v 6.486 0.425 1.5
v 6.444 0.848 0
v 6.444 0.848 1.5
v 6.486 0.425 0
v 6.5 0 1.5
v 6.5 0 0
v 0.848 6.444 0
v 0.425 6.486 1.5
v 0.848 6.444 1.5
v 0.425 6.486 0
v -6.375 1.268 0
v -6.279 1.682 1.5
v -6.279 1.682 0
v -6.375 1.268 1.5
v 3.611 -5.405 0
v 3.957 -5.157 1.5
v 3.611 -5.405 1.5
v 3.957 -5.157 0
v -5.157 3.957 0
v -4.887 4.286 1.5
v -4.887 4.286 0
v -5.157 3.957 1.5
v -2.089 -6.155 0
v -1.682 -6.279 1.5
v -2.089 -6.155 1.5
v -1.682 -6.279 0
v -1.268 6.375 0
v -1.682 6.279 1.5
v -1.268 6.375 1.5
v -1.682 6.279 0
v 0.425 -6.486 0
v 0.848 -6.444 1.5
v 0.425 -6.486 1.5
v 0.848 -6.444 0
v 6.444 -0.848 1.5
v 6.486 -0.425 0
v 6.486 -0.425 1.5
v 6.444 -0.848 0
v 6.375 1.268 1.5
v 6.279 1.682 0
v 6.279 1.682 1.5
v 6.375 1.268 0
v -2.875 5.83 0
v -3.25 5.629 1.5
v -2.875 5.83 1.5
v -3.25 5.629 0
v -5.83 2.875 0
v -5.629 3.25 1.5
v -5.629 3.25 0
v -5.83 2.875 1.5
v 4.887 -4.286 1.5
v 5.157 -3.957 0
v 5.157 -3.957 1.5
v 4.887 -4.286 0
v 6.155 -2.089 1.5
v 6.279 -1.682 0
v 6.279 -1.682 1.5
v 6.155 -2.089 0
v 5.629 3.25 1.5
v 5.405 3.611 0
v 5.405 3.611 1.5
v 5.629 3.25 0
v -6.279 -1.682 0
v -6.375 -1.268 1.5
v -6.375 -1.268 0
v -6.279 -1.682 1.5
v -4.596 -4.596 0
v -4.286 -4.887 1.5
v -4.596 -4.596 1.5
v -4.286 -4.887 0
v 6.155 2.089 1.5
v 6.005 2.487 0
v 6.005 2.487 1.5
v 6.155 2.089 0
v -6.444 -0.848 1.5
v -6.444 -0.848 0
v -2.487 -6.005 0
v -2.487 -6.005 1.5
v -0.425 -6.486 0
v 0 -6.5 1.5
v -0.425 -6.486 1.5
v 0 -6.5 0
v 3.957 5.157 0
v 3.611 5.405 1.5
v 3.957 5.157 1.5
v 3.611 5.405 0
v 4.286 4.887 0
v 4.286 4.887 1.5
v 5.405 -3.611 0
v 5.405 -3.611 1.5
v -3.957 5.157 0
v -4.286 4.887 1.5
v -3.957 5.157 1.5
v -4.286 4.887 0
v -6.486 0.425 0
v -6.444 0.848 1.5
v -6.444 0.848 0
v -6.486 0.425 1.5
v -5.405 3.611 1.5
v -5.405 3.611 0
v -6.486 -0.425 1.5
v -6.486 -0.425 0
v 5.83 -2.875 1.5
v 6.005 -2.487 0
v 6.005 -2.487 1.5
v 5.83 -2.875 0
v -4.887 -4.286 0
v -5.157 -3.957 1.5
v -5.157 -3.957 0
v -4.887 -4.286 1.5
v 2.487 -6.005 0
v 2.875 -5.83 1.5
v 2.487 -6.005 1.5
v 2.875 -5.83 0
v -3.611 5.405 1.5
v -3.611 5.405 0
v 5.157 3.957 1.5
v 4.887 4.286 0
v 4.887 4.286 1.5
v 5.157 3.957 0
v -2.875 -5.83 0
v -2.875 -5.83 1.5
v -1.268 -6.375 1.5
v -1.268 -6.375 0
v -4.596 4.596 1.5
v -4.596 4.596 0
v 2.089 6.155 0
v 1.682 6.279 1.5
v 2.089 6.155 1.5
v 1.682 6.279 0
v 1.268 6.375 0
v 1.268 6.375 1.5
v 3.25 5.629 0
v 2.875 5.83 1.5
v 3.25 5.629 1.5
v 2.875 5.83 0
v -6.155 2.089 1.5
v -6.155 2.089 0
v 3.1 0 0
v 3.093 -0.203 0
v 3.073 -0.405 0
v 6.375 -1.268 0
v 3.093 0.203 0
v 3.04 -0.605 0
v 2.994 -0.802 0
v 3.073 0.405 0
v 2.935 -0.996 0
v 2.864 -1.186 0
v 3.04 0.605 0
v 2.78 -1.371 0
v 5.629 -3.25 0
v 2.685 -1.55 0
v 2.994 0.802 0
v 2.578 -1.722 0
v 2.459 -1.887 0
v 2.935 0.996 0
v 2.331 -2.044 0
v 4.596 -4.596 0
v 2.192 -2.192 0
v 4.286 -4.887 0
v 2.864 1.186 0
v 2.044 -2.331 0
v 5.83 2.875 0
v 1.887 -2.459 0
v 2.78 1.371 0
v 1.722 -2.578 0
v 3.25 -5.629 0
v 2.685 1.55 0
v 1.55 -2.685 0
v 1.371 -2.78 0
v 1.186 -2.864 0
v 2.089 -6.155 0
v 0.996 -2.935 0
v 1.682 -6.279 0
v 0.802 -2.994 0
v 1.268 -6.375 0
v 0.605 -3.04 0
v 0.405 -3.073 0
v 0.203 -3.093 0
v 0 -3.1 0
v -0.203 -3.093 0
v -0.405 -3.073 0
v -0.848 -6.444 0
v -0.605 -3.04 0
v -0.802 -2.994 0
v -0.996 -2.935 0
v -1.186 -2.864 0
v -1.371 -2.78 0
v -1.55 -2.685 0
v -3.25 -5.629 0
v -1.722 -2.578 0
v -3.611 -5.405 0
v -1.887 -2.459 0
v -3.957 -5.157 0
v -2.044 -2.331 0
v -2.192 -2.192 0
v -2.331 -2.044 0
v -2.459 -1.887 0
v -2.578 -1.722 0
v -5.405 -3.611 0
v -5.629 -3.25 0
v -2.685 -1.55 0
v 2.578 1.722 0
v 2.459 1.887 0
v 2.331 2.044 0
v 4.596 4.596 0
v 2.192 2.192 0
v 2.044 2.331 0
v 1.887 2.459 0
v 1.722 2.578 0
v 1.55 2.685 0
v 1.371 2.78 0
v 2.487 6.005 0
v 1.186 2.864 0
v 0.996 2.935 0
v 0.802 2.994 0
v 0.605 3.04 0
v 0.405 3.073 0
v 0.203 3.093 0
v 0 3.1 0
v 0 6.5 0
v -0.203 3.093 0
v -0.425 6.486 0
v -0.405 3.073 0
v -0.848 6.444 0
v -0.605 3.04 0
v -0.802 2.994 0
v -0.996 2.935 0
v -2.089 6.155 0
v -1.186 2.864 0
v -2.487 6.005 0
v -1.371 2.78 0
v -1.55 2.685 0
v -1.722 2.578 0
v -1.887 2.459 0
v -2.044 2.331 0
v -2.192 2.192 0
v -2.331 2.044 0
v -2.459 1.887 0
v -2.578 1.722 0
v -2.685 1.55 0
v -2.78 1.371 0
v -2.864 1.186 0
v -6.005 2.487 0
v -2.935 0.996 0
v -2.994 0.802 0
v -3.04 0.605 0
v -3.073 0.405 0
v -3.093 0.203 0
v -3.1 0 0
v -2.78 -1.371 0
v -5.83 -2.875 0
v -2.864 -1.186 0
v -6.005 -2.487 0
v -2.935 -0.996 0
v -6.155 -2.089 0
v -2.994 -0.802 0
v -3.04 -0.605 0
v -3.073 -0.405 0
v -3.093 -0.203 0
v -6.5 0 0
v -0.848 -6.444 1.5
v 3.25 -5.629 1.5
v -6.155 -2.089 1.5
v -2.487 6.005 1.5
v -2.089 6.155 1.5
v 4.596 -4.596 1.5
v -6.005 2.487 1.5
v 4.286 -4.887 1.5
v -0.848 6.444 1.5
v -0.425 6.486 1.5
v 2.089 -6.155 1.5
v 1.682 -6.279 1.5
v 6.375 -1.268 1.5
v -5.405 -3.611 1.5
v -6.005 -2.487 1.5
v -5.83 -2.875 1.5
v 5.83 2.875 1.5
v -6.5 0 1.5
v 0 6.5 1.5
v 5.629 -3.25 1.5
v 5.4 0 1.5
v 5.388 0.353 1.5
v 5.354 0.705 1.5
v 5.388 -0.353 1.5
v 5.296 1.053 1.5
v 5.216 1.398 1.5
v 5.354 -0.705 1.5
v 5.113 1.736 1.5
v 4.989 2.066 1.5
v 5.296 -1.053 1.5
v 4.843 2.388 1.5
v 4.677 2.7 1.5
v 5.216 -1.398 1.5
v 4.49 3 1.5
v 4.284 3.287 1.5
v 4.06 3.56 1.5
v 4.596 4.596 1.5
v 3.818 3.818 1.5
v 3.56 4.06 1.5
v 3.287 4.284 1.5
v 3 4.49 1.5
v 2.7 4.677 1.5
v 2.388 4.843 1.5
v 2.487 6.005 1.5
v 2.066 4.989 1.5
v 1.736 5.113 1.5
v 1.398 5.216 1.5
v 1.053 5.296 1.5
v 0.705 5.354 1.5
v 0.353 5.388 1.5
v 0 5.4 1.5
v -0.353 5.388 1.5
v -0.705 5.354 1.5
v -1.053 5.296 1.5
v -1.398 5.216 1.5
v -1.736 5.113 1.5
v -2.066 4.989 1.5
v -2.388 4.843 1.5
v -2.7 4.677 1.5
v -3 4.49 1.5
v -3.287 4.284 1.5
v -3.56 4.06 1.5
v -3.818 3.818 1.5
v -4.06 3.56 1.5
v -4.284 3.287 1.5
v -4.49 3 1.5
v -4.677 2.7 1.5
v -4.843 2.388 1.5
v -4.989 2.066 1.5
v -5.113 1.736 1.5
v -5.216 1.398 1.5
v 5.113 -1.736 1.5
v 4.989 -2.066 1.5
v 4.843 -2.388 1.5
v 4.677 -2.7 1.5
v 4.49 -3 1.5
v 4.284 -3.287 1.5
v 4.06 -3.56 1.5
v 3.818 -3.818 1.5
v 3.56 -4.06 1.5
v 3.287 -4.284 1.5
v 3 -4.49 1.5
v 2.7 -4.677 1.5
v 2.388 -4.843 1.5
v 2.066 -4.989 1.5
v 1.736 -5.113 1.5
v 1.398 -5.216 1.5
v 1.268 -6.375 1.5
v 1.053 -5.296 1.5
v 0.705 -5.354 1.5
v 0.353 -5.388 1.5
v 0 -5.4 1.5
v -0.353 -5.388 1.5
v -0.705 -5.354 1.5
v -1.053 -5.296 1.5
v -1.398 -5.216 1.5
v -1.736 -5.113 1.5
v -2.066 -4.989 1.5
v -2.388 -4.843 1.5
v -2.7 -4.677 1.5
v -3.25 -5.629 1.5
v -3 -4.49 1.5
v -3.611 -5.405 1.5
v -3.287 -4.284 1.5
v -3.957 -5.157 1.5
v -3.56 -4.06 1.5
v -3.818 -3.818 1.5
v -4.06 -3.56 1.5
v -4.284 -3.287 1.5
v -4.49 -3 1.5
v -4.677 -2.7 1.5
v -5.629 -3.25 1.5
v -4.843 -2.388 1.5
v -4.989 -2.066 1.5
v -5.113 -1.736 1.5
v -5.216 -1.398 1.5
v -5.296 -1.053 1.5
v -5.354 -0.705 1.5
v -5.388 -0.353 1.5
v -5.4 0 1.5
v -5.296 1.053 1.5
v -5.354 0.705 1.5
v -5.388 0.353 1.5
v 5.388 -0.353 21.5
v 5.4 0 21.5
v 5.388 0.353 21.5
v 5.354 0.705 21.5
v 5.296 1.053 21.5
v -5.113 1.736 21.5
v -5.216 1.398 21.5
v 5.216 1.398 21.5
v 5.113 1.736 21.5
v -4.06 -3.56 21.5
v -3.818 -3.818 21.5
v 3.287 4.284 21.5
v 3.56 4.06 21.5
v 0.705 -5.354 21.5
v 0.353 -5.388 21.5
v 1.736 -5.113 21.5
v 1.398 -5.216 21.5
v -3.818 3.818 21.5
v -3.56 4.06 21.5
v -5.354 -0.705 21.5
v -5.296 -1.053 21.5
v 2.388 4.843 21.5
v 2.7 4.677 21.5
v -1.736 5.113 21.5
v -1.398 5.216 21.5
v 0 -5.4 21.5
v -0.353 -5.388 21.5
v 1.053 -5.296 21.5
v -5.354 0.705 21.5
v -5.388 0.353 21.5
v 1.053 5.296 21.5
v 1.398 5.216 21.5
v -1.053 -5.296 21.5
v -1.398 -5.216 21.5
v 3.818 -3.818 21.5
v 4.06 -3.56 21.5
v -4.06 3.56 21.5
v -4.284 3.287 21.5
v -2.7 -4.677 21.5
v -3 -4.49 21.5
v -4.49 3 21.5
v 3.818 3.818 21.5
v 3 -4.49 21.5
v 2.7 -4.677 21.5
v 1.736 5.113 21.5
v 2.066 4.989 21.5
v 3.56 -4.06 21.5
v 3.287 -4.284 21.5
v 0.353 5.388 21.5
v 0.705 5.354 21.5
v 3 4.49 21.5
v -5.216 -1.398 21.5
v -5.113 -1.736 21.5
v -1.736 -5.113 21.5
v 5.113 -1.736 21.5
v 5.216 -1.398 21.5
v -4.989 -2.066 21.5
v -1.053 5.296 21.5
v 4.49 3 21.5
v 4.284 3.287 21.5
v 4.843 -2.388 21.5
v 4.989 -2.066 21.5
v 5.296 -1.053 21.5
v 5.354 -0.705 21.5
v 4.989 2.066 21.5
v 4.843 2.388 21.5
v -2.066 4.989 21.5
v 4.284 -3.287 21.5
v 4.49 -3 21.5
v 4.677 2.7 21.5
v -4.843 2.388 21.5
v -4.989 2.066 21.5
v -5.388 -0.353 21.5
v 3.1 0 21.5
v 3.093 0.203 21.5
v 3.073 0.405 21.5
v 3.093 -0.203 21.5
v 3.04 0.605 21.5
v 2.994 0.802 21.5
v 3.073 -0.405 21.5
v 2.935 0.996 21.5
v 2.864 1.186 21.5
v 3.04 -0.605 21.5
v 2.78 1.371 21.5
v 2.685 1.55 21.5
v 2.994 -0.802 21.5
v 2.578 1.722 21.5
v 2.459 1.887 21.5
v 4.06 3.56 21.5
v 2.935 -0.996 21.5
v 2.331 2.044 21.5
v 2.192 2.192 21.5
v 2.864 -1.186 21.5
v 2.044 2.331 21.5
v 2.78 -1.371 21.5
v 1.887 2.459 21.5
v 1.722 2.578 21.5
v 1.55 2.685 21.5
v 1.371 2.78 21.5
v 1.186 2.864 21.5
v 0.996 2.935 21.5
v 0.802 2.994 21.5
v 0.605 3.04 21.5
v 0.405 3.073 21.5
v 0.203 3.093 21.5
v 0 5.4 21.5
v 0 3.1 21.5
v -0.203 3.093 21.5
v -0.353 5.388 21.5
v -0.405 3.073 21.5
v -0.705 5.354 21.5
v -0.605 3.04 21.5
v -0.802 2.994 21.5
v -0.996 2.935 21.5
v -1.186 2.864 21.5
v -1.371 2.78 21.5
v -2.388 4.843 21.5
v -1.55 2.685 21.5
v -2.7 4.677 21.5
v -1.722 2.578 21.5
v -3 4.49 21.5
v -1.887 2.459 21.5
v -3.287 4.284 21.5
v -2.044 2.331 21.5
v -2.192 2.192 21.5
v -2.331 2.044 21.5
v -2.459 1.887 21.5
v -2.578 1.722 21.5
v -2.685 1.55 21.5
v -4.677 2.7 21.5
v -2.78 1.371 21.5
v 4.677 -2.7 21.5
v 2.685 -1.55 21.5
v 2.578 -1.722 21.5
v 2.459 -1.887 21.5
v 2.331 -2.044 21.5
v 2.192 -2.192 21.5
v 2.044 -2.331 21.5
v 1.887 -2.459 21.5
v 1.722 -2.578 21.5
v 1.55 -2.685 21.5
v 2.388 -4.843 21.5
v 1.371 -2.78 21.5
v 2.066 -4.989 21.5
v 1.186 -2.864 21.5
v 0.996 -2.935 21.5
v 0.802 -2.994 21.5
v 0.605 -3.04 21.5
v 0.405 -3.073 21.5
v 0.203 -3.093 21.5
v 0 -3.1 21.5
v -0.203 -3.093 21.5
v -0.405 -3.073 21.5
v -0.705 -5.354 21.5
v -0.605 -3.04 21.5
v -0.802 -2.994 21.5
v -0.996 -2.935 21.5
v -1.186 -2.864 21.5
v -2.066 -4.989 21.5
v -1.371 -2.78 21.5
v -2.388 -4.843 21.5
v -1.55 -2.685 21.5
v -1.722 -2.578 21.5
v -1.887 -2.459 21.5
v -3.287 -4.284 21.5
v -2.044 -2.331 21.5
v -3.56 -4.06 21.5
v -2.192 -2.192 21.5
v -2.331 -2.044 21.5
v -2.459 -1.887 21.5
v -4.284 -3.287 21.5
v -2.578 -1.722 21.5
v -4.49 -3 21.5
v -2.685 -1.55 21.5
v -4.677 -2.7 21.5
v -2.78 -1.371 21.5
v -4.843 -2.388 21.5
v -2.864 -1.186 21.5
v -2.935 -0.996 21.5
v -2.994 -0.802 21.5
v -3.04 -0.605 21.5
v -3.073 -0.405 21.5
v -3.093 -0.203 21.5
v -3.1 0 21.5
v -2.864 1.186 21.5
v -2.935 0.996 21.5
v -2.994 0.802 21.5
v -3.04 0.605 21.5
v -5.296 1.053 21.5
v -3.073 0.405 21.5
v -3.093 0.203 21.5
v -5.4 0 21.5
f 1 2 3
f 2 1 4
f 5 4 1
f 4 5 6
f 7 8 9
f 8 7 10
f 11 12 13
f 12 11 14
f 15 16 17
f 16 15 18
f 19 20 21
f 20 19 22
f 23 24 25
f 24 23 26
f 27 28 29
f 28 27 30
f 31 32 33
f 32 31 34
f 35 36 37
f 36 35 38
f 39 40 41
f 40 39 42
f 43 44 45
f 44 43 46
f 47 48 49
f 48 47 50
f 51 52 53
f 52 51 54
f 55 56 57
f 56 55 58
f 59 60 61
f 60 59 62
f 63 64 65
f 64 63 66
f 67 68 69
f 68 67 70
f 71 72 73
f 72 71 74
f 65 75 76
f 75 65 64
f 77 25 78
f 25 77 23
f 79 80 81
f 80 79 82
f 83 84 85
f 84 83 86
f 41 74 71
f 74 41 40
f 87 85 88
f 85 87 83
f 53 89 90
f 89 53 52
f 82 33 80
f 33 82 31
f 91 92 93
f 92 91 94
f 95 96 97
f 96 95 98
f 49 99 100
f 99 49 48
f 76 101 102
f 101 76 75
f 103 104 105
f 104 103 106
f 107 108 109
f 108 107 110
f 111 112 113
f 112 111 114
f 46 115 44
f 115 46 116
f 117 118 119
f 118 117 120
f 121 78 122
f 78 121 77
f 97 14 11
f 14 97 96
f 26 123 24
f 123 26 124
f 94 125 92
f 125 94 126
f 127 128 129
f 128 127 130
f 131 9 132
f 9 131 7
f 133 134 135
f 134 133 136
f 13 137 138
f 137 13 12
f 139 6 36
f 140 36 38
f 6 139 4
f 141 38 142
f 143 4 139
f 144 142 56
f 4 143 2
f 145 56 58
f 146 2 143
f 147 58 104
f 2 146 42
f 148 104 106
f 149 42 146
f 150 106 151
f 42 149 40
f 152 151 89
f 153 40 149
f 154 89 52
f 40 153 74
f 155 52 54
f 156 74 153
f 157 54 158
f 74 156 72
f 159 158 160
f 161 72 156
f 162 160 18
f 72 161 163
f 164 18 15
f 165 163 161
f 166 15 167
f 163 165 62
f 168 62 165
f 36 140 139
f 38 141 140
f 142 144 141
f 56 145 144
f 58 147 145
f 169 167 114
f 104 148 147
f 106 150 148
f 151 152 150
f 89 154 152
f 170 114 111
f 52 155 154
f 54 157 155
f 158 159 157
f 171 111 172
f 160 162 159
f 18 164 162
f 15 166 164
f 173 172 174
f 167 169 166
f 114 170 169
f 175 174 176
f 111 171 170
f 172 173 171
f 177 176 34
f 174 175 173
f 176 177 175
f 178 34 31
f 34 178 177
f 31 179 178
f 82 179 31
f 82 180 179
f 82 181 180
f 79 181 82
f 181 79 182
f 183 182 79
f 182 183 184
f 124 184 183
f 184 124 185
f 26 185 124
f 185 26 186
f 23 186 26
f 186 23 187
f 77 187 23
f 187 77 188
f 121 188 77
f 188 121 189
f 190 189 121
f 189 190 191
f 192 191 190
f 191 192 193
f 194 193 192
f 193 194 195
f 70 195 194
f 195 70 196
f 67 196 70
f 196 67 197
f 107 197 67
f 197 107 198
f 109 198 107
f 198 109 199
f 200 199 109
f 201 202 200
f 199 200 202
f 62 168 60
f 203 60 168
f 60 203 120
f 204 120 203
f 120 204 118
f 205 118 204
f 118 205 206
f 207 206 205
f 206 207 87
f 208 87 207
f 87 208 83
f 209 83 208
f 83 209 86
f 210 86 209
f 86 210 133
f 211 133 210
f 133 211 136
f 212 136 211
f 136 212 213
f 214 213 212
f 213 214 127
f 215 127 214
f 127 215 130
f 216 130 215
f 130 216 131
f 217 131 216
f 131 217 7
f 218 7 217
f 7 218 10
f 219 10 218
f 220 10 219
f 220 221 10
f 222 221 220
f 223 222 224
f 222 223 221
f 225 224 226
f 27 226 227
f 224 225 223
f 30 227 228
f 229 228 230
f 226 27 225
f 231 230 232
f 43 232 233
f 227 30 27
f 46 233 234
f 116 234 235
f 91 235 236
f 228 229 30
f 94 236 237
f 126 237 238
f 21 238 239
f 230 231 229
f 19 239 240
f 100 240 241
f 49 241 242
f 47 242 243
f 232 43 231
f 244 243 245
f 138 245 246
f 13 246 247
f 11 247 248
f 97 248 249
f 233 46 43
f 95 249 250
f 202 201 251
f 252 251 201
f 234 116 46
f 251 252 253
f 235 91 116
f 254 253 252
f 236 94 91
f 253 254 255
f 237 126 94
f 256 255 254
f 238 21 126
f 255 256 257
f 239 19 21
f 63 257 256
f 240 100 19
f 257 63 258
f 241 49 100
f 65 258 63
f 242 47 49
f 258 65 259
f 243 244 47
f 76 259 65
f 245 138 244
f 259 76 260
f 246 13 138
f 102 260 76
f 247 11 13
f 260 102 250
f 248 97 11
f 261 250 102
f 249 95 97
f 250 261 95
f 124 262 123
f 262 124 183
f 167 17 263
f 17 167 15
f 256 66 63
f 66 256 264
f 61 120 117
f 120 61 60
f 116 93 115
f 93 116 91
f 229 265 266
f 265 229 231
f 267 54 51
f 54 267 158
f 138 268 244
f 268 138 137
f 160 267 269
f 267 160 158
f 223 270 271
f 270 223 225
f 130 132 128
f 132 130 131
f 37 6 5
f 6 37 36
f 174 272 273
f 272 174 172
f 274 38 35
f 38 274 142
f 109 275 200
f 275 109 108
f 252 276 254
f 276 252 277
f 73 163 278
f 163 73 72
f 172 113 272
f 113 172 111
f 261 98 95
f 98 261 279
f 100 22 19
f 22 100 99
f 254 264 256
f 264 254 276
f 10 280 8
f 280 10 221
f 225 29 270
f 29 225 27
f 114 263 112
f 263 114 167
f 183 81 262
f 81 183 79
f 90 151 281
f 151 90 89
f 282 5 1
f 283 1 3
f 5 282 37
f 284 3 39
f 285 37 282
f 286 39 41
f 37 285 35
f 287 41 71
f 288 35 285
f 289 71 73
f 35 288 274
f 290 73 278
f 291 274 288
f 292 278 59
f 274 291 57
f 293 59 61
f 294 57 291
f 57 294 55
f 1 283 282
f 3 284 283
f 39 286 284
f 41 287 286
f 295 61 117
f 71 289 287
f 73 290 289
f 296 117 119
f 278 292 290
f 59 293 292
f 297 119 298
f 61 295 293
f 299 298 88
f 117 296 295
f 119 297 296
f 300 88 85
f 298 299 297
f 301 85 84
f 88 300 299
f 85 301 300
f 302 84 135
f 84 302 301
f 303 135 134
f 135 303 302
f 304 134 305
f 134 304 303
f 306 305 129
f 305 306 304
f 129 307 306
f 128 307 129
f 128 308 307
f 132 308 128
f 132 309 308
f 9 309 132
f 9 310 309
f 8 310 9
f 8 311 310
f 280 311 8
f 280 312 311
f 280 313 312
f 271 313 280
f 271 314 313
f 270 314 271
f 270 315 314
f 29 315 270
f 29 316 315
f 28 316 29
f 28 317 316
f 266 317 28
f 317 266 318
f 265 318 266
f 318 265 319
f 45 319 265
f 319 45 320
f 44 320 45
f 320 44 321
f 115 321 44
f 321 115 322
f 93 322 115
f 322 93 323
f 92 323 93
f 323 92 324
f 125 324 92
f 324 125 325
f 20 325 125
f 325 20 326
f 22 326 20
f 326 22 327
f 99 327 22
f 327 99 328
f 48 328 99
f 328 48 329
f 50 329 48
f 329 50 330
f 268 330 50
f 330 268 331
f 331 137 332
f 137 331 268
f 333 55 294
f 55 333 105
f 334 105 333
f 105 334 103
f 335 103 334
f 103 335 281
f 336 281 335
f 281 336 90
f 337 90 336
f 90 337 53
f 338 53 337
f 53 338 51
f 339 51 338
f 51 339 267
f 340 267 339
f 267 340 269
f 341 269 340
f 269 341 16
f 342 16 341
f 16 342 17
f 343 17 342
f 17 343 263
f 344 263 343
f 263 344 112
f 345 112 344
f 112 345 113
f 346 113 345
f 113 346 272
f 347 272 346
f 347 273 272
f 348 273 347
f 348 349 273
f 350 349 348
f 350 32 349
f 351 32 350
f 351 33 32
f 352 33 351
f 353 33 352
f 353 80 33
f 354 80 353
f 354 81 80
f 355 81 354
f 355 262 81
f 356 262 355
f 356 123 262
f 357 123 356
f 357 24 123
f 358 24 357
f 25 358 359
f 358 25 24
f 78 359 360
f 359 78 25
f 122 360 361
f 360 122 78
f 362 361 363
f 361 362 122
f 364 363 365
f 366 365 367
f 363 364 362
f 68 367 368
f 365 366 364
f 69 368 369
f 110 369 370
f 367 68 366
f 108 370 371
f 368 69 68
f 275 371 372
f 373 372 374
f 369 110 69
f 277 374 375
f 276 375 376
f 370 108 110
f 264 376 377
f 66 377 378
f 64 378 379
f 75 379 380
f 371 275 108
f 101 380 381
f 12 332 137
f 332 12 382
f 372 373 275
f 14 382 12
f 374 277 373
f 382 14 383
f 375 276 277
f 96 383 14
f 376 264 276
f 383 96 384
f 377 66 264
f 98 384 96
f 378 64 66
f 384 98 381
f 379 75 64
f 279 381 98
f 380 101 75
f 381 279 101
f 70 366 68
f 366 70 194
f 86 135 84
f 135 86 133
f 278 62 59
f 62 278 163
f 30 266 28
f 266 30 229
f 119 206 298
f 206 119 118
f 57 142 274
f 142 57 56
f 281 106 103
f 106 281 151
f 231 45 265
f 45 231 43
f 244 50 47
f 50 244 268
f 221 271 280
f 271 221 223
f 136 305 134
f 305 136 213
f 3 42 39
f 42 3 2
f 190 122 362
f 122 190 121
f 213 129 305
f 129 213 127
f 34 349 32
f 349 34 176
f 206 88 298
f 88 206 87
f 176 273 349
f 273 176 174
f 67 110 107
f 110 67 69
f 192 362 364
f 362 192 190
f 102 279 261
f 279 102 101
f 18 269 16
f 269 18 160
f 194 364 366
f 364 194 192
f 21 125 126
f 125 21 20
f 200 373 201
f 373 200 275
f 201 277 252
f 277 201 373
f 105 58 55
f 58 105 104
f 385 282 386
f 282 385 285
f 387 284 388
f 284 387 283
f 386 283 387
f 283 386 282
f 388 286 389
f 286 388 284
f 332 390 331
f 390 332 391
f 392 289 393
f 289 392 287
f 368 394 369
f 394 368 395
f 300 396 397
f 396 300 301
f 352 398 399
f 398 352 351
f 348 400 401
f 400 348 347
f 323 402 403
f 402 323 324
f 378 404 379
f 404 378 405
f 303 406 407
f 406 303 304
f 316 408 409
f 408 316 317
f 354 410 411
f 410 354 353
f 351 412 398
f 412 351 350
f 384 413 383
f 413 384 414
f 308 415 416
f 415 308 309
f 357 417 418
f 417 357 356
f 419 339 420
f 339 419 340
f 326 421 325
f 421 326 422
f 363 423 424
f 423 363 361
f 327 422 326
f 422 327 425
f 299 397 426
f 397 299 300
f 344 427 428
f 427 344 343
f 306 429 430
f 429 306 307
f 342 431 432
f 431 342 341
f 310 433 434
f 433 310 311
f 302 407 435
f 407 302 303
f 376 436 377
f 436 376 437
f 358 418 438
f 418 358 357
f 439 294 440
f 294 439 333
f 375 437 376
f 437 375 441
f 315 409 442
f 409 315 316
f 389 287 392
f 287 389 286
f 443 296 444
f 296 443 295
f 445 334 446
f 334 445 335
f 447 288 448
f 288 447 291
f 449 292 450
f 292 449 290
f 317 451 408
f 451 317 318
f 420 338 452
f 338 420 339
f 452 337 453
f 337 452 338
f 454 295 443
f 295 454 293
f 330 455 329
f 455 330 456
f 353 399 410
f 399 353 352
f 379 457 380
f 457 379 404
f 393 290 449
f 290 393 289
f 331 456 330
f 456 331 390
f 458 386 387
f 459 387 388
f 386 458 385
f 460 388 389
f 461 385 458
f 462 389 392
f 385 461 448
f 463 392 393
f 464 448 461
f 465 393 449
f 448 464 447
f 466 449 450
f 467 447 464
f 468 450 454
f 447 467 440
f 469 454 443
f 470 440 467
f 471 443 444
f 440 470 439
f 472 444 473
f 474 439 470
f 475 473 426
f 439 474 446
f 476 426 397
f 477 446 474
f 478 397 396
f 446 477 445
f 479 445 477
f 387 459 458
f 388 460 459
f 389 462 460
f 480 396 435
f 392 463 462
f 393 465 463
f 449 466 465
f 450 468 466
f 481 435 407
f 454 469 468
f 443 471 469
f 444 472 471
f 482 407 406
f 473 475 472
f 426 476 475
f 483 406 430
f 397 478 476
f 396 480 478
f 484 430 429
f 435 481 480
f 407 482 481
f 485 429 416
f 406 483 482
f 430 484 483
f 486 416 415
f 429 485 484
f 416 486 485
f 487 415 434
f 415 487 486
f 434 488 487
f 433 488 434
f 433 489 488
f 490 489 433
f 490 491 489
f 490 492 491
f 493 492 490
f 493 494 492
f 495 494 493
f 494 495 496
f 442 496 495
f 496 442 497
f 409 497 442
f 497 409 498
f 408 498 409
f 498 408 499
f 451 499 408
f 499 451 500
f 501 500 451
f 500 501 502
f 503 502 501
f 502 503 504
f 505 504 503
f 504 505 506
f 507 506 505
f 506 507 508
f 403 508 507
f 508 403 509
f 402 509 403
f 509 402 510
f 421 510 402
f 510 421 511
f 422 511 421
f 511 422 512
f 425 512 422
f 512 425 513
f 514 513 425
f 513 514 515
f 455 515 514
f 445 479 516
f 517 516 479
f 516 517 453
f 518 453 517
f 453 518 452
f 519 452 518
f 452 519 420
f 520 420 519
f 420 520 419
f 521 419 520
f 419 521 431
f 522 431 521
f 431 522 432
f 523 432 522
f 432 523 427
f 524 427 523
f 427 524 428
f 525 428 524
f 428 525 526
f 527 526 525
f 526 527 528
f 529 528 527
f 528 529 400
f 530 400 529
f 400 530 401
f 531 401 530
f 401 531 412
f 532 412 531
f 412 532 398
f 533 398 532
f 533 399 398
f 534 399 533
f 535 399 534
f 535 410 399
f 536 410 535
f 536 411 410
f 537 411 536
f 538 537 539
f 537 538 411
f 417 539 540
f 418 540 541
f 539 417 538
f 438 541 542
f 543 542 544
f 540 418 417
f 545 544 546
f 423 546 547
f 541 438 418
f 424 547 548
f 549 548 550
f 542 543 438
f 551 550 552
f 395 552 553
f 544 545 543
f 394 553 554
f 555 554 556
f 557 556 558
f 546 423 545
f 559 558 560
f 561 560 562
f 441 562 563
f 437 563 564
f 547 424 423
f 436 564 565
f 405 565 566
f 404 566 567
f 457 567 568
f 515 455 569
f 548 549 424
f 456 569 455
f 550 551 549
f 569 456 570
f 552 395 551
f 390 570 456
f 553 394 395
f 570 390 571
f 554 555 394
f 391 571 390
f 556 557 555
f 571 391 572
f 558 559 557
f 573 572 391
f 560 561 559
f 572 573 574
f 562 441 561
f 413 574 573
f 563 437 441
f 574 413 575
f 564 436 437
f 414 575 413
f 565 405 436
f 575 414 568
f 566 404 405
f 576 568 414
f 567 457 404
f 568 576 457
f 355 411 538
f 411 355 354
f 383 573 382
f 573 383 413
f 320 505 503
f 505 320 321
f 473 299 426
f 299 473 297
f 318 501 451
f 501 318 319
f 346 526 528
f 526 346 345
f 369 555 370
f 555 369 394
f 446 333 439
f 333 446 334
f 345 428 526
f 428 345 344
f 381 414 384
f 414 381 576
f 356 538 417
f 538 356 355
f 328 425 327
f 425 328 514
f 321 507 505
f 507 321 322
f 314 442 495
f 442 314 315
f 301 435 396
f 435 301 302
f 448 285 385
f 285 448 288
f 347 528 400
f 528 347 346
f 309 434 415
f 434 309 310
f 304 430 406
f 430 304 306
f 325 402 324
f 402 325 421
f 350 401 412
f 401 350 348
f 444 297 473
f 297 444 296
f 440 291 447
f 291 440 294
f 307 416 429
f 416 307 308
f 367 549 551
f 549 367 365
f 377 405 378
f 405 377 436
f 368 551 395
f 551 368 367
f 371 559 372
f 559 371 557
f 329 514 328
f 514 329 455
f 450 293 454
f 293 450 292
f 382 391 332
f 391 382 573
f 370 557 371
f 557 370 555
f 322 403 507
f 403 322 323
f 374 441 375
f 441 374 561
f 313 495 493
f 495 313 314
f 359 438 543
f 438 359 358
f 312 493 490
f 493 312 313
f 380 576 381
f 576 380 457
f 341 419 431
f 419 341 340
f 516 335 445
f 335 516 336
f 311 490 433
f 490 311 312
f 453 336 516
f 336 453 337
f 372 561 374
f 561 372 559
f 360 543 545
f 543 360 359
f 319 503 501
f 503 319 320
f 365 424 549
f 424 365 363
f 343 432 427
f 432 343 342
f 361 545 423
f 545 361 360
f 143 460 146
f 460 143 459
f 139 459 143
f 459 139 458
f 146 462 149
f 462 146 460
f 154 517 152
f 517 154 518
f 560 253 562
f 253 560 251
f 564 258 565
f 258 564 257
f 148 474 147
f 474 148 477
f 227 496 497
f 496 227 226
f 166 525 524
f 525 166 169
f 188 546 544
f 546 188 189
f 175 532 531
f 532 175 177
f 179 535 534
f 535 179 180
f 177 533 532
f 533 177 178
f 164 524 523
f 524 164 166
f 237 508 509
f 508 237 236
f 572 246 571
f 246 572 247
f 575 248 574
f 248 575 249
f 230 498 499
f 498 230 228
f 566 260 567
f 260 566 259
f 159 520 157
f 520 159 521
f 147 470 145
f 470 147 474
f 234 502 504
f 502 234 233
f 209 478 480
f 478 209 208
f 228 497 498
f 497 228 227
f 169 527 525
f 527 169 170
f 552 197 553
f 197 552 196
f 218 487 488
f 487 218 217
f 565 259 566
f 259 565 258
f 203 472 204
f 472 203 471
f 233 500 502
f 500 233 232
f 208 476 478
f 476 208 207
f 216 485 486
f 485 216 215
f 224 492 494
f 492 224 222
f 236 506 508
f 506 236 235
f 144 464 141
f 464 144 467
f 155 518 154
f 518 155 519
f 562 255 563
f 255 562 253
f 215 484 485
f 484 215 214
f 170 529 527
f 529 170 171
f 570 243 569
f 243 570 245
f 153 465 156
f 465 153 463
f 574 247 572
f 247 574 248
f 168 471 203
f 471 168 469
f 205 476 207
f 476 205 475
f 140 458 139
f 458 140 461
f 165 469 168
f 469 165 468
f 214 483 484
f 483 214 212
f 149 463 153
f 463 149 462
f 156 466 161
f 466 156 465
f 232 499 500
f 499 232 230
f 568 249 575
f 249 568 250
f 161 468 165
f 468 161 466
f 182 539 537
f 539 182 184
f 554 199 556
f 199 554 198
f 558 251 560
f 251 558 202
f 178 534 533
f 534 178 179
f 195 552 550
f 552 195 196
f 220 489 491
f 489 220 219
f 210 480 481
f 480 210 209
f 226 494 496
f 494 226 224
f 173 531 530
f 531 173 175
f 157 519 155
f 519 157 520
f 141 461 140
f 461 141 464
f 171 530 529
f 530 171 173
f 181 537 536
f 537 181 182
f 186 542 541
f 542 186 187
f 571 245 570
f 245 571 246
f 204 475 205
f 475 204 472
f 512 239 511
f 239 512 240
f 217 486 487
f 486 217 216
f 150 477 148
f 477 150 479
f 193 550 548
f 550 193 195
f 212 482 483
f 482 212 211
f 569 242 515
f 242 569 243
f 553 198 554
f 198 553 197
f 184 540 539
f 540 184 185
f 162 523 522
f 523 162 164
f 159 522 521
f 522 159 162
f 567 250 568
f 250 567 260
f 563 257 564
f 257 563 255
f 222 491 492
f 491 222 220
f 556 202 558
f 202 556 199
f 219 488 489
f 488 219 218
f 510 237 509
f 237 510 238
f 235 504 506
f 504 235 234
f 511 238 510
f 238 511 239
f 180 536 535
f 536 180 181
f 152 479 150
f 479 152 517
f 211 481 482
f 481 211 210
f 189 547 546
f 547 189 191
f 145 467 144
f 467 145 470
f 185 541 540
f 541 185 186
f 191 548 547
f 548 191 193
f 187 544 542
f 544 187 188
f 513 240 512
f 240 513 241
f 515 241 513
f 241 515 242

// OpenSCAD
// PCR tube adapter sleeve: fits a 0.2 mL tube in a 1.5 mL rack hole
// Print orientation: collar on bed (z = 0), sleeve body rises to top

// ---------------- Parameters ----------------
collar_d      = 13;    // collar outer diameter (on bed)
collar_t      = 1.5;   // collar thickness (z = 0 to 1.5)
sleeve_d      = 10.8;  // sleeve body outer diameter
sleeve_h      = 20;    // sleeve body height above collar (z = 1.5 to 21.5)
bore_d        = 6.2;   // through-bore diameter
eps           = 0.5;   // cutter overshoot past faces
$fn           = 96;    // curve resolution

// Derived
sleeve_top_z  = collar_t + sleeve_h;   // 21.5
total_h       = collar_t + sleeve_h;   // 21.5

// ---------------- Model ----------------
difference() {
    union() {
        // Collar (z = 0 to 1.5)
        cylinder(d = collar_d, h = collar_t);
        // Sleeve body (z = 1.5 to 21.5)
        translate([0, 0, collar_t])
            cylinder(d = sleeve_d, h = sleeve_h);
    }
    // Through bore (extends past both ends)
    translate([0, 0, -eps])
        cylinder(d = bore_d, h = total_h + 2 * eps);
}
